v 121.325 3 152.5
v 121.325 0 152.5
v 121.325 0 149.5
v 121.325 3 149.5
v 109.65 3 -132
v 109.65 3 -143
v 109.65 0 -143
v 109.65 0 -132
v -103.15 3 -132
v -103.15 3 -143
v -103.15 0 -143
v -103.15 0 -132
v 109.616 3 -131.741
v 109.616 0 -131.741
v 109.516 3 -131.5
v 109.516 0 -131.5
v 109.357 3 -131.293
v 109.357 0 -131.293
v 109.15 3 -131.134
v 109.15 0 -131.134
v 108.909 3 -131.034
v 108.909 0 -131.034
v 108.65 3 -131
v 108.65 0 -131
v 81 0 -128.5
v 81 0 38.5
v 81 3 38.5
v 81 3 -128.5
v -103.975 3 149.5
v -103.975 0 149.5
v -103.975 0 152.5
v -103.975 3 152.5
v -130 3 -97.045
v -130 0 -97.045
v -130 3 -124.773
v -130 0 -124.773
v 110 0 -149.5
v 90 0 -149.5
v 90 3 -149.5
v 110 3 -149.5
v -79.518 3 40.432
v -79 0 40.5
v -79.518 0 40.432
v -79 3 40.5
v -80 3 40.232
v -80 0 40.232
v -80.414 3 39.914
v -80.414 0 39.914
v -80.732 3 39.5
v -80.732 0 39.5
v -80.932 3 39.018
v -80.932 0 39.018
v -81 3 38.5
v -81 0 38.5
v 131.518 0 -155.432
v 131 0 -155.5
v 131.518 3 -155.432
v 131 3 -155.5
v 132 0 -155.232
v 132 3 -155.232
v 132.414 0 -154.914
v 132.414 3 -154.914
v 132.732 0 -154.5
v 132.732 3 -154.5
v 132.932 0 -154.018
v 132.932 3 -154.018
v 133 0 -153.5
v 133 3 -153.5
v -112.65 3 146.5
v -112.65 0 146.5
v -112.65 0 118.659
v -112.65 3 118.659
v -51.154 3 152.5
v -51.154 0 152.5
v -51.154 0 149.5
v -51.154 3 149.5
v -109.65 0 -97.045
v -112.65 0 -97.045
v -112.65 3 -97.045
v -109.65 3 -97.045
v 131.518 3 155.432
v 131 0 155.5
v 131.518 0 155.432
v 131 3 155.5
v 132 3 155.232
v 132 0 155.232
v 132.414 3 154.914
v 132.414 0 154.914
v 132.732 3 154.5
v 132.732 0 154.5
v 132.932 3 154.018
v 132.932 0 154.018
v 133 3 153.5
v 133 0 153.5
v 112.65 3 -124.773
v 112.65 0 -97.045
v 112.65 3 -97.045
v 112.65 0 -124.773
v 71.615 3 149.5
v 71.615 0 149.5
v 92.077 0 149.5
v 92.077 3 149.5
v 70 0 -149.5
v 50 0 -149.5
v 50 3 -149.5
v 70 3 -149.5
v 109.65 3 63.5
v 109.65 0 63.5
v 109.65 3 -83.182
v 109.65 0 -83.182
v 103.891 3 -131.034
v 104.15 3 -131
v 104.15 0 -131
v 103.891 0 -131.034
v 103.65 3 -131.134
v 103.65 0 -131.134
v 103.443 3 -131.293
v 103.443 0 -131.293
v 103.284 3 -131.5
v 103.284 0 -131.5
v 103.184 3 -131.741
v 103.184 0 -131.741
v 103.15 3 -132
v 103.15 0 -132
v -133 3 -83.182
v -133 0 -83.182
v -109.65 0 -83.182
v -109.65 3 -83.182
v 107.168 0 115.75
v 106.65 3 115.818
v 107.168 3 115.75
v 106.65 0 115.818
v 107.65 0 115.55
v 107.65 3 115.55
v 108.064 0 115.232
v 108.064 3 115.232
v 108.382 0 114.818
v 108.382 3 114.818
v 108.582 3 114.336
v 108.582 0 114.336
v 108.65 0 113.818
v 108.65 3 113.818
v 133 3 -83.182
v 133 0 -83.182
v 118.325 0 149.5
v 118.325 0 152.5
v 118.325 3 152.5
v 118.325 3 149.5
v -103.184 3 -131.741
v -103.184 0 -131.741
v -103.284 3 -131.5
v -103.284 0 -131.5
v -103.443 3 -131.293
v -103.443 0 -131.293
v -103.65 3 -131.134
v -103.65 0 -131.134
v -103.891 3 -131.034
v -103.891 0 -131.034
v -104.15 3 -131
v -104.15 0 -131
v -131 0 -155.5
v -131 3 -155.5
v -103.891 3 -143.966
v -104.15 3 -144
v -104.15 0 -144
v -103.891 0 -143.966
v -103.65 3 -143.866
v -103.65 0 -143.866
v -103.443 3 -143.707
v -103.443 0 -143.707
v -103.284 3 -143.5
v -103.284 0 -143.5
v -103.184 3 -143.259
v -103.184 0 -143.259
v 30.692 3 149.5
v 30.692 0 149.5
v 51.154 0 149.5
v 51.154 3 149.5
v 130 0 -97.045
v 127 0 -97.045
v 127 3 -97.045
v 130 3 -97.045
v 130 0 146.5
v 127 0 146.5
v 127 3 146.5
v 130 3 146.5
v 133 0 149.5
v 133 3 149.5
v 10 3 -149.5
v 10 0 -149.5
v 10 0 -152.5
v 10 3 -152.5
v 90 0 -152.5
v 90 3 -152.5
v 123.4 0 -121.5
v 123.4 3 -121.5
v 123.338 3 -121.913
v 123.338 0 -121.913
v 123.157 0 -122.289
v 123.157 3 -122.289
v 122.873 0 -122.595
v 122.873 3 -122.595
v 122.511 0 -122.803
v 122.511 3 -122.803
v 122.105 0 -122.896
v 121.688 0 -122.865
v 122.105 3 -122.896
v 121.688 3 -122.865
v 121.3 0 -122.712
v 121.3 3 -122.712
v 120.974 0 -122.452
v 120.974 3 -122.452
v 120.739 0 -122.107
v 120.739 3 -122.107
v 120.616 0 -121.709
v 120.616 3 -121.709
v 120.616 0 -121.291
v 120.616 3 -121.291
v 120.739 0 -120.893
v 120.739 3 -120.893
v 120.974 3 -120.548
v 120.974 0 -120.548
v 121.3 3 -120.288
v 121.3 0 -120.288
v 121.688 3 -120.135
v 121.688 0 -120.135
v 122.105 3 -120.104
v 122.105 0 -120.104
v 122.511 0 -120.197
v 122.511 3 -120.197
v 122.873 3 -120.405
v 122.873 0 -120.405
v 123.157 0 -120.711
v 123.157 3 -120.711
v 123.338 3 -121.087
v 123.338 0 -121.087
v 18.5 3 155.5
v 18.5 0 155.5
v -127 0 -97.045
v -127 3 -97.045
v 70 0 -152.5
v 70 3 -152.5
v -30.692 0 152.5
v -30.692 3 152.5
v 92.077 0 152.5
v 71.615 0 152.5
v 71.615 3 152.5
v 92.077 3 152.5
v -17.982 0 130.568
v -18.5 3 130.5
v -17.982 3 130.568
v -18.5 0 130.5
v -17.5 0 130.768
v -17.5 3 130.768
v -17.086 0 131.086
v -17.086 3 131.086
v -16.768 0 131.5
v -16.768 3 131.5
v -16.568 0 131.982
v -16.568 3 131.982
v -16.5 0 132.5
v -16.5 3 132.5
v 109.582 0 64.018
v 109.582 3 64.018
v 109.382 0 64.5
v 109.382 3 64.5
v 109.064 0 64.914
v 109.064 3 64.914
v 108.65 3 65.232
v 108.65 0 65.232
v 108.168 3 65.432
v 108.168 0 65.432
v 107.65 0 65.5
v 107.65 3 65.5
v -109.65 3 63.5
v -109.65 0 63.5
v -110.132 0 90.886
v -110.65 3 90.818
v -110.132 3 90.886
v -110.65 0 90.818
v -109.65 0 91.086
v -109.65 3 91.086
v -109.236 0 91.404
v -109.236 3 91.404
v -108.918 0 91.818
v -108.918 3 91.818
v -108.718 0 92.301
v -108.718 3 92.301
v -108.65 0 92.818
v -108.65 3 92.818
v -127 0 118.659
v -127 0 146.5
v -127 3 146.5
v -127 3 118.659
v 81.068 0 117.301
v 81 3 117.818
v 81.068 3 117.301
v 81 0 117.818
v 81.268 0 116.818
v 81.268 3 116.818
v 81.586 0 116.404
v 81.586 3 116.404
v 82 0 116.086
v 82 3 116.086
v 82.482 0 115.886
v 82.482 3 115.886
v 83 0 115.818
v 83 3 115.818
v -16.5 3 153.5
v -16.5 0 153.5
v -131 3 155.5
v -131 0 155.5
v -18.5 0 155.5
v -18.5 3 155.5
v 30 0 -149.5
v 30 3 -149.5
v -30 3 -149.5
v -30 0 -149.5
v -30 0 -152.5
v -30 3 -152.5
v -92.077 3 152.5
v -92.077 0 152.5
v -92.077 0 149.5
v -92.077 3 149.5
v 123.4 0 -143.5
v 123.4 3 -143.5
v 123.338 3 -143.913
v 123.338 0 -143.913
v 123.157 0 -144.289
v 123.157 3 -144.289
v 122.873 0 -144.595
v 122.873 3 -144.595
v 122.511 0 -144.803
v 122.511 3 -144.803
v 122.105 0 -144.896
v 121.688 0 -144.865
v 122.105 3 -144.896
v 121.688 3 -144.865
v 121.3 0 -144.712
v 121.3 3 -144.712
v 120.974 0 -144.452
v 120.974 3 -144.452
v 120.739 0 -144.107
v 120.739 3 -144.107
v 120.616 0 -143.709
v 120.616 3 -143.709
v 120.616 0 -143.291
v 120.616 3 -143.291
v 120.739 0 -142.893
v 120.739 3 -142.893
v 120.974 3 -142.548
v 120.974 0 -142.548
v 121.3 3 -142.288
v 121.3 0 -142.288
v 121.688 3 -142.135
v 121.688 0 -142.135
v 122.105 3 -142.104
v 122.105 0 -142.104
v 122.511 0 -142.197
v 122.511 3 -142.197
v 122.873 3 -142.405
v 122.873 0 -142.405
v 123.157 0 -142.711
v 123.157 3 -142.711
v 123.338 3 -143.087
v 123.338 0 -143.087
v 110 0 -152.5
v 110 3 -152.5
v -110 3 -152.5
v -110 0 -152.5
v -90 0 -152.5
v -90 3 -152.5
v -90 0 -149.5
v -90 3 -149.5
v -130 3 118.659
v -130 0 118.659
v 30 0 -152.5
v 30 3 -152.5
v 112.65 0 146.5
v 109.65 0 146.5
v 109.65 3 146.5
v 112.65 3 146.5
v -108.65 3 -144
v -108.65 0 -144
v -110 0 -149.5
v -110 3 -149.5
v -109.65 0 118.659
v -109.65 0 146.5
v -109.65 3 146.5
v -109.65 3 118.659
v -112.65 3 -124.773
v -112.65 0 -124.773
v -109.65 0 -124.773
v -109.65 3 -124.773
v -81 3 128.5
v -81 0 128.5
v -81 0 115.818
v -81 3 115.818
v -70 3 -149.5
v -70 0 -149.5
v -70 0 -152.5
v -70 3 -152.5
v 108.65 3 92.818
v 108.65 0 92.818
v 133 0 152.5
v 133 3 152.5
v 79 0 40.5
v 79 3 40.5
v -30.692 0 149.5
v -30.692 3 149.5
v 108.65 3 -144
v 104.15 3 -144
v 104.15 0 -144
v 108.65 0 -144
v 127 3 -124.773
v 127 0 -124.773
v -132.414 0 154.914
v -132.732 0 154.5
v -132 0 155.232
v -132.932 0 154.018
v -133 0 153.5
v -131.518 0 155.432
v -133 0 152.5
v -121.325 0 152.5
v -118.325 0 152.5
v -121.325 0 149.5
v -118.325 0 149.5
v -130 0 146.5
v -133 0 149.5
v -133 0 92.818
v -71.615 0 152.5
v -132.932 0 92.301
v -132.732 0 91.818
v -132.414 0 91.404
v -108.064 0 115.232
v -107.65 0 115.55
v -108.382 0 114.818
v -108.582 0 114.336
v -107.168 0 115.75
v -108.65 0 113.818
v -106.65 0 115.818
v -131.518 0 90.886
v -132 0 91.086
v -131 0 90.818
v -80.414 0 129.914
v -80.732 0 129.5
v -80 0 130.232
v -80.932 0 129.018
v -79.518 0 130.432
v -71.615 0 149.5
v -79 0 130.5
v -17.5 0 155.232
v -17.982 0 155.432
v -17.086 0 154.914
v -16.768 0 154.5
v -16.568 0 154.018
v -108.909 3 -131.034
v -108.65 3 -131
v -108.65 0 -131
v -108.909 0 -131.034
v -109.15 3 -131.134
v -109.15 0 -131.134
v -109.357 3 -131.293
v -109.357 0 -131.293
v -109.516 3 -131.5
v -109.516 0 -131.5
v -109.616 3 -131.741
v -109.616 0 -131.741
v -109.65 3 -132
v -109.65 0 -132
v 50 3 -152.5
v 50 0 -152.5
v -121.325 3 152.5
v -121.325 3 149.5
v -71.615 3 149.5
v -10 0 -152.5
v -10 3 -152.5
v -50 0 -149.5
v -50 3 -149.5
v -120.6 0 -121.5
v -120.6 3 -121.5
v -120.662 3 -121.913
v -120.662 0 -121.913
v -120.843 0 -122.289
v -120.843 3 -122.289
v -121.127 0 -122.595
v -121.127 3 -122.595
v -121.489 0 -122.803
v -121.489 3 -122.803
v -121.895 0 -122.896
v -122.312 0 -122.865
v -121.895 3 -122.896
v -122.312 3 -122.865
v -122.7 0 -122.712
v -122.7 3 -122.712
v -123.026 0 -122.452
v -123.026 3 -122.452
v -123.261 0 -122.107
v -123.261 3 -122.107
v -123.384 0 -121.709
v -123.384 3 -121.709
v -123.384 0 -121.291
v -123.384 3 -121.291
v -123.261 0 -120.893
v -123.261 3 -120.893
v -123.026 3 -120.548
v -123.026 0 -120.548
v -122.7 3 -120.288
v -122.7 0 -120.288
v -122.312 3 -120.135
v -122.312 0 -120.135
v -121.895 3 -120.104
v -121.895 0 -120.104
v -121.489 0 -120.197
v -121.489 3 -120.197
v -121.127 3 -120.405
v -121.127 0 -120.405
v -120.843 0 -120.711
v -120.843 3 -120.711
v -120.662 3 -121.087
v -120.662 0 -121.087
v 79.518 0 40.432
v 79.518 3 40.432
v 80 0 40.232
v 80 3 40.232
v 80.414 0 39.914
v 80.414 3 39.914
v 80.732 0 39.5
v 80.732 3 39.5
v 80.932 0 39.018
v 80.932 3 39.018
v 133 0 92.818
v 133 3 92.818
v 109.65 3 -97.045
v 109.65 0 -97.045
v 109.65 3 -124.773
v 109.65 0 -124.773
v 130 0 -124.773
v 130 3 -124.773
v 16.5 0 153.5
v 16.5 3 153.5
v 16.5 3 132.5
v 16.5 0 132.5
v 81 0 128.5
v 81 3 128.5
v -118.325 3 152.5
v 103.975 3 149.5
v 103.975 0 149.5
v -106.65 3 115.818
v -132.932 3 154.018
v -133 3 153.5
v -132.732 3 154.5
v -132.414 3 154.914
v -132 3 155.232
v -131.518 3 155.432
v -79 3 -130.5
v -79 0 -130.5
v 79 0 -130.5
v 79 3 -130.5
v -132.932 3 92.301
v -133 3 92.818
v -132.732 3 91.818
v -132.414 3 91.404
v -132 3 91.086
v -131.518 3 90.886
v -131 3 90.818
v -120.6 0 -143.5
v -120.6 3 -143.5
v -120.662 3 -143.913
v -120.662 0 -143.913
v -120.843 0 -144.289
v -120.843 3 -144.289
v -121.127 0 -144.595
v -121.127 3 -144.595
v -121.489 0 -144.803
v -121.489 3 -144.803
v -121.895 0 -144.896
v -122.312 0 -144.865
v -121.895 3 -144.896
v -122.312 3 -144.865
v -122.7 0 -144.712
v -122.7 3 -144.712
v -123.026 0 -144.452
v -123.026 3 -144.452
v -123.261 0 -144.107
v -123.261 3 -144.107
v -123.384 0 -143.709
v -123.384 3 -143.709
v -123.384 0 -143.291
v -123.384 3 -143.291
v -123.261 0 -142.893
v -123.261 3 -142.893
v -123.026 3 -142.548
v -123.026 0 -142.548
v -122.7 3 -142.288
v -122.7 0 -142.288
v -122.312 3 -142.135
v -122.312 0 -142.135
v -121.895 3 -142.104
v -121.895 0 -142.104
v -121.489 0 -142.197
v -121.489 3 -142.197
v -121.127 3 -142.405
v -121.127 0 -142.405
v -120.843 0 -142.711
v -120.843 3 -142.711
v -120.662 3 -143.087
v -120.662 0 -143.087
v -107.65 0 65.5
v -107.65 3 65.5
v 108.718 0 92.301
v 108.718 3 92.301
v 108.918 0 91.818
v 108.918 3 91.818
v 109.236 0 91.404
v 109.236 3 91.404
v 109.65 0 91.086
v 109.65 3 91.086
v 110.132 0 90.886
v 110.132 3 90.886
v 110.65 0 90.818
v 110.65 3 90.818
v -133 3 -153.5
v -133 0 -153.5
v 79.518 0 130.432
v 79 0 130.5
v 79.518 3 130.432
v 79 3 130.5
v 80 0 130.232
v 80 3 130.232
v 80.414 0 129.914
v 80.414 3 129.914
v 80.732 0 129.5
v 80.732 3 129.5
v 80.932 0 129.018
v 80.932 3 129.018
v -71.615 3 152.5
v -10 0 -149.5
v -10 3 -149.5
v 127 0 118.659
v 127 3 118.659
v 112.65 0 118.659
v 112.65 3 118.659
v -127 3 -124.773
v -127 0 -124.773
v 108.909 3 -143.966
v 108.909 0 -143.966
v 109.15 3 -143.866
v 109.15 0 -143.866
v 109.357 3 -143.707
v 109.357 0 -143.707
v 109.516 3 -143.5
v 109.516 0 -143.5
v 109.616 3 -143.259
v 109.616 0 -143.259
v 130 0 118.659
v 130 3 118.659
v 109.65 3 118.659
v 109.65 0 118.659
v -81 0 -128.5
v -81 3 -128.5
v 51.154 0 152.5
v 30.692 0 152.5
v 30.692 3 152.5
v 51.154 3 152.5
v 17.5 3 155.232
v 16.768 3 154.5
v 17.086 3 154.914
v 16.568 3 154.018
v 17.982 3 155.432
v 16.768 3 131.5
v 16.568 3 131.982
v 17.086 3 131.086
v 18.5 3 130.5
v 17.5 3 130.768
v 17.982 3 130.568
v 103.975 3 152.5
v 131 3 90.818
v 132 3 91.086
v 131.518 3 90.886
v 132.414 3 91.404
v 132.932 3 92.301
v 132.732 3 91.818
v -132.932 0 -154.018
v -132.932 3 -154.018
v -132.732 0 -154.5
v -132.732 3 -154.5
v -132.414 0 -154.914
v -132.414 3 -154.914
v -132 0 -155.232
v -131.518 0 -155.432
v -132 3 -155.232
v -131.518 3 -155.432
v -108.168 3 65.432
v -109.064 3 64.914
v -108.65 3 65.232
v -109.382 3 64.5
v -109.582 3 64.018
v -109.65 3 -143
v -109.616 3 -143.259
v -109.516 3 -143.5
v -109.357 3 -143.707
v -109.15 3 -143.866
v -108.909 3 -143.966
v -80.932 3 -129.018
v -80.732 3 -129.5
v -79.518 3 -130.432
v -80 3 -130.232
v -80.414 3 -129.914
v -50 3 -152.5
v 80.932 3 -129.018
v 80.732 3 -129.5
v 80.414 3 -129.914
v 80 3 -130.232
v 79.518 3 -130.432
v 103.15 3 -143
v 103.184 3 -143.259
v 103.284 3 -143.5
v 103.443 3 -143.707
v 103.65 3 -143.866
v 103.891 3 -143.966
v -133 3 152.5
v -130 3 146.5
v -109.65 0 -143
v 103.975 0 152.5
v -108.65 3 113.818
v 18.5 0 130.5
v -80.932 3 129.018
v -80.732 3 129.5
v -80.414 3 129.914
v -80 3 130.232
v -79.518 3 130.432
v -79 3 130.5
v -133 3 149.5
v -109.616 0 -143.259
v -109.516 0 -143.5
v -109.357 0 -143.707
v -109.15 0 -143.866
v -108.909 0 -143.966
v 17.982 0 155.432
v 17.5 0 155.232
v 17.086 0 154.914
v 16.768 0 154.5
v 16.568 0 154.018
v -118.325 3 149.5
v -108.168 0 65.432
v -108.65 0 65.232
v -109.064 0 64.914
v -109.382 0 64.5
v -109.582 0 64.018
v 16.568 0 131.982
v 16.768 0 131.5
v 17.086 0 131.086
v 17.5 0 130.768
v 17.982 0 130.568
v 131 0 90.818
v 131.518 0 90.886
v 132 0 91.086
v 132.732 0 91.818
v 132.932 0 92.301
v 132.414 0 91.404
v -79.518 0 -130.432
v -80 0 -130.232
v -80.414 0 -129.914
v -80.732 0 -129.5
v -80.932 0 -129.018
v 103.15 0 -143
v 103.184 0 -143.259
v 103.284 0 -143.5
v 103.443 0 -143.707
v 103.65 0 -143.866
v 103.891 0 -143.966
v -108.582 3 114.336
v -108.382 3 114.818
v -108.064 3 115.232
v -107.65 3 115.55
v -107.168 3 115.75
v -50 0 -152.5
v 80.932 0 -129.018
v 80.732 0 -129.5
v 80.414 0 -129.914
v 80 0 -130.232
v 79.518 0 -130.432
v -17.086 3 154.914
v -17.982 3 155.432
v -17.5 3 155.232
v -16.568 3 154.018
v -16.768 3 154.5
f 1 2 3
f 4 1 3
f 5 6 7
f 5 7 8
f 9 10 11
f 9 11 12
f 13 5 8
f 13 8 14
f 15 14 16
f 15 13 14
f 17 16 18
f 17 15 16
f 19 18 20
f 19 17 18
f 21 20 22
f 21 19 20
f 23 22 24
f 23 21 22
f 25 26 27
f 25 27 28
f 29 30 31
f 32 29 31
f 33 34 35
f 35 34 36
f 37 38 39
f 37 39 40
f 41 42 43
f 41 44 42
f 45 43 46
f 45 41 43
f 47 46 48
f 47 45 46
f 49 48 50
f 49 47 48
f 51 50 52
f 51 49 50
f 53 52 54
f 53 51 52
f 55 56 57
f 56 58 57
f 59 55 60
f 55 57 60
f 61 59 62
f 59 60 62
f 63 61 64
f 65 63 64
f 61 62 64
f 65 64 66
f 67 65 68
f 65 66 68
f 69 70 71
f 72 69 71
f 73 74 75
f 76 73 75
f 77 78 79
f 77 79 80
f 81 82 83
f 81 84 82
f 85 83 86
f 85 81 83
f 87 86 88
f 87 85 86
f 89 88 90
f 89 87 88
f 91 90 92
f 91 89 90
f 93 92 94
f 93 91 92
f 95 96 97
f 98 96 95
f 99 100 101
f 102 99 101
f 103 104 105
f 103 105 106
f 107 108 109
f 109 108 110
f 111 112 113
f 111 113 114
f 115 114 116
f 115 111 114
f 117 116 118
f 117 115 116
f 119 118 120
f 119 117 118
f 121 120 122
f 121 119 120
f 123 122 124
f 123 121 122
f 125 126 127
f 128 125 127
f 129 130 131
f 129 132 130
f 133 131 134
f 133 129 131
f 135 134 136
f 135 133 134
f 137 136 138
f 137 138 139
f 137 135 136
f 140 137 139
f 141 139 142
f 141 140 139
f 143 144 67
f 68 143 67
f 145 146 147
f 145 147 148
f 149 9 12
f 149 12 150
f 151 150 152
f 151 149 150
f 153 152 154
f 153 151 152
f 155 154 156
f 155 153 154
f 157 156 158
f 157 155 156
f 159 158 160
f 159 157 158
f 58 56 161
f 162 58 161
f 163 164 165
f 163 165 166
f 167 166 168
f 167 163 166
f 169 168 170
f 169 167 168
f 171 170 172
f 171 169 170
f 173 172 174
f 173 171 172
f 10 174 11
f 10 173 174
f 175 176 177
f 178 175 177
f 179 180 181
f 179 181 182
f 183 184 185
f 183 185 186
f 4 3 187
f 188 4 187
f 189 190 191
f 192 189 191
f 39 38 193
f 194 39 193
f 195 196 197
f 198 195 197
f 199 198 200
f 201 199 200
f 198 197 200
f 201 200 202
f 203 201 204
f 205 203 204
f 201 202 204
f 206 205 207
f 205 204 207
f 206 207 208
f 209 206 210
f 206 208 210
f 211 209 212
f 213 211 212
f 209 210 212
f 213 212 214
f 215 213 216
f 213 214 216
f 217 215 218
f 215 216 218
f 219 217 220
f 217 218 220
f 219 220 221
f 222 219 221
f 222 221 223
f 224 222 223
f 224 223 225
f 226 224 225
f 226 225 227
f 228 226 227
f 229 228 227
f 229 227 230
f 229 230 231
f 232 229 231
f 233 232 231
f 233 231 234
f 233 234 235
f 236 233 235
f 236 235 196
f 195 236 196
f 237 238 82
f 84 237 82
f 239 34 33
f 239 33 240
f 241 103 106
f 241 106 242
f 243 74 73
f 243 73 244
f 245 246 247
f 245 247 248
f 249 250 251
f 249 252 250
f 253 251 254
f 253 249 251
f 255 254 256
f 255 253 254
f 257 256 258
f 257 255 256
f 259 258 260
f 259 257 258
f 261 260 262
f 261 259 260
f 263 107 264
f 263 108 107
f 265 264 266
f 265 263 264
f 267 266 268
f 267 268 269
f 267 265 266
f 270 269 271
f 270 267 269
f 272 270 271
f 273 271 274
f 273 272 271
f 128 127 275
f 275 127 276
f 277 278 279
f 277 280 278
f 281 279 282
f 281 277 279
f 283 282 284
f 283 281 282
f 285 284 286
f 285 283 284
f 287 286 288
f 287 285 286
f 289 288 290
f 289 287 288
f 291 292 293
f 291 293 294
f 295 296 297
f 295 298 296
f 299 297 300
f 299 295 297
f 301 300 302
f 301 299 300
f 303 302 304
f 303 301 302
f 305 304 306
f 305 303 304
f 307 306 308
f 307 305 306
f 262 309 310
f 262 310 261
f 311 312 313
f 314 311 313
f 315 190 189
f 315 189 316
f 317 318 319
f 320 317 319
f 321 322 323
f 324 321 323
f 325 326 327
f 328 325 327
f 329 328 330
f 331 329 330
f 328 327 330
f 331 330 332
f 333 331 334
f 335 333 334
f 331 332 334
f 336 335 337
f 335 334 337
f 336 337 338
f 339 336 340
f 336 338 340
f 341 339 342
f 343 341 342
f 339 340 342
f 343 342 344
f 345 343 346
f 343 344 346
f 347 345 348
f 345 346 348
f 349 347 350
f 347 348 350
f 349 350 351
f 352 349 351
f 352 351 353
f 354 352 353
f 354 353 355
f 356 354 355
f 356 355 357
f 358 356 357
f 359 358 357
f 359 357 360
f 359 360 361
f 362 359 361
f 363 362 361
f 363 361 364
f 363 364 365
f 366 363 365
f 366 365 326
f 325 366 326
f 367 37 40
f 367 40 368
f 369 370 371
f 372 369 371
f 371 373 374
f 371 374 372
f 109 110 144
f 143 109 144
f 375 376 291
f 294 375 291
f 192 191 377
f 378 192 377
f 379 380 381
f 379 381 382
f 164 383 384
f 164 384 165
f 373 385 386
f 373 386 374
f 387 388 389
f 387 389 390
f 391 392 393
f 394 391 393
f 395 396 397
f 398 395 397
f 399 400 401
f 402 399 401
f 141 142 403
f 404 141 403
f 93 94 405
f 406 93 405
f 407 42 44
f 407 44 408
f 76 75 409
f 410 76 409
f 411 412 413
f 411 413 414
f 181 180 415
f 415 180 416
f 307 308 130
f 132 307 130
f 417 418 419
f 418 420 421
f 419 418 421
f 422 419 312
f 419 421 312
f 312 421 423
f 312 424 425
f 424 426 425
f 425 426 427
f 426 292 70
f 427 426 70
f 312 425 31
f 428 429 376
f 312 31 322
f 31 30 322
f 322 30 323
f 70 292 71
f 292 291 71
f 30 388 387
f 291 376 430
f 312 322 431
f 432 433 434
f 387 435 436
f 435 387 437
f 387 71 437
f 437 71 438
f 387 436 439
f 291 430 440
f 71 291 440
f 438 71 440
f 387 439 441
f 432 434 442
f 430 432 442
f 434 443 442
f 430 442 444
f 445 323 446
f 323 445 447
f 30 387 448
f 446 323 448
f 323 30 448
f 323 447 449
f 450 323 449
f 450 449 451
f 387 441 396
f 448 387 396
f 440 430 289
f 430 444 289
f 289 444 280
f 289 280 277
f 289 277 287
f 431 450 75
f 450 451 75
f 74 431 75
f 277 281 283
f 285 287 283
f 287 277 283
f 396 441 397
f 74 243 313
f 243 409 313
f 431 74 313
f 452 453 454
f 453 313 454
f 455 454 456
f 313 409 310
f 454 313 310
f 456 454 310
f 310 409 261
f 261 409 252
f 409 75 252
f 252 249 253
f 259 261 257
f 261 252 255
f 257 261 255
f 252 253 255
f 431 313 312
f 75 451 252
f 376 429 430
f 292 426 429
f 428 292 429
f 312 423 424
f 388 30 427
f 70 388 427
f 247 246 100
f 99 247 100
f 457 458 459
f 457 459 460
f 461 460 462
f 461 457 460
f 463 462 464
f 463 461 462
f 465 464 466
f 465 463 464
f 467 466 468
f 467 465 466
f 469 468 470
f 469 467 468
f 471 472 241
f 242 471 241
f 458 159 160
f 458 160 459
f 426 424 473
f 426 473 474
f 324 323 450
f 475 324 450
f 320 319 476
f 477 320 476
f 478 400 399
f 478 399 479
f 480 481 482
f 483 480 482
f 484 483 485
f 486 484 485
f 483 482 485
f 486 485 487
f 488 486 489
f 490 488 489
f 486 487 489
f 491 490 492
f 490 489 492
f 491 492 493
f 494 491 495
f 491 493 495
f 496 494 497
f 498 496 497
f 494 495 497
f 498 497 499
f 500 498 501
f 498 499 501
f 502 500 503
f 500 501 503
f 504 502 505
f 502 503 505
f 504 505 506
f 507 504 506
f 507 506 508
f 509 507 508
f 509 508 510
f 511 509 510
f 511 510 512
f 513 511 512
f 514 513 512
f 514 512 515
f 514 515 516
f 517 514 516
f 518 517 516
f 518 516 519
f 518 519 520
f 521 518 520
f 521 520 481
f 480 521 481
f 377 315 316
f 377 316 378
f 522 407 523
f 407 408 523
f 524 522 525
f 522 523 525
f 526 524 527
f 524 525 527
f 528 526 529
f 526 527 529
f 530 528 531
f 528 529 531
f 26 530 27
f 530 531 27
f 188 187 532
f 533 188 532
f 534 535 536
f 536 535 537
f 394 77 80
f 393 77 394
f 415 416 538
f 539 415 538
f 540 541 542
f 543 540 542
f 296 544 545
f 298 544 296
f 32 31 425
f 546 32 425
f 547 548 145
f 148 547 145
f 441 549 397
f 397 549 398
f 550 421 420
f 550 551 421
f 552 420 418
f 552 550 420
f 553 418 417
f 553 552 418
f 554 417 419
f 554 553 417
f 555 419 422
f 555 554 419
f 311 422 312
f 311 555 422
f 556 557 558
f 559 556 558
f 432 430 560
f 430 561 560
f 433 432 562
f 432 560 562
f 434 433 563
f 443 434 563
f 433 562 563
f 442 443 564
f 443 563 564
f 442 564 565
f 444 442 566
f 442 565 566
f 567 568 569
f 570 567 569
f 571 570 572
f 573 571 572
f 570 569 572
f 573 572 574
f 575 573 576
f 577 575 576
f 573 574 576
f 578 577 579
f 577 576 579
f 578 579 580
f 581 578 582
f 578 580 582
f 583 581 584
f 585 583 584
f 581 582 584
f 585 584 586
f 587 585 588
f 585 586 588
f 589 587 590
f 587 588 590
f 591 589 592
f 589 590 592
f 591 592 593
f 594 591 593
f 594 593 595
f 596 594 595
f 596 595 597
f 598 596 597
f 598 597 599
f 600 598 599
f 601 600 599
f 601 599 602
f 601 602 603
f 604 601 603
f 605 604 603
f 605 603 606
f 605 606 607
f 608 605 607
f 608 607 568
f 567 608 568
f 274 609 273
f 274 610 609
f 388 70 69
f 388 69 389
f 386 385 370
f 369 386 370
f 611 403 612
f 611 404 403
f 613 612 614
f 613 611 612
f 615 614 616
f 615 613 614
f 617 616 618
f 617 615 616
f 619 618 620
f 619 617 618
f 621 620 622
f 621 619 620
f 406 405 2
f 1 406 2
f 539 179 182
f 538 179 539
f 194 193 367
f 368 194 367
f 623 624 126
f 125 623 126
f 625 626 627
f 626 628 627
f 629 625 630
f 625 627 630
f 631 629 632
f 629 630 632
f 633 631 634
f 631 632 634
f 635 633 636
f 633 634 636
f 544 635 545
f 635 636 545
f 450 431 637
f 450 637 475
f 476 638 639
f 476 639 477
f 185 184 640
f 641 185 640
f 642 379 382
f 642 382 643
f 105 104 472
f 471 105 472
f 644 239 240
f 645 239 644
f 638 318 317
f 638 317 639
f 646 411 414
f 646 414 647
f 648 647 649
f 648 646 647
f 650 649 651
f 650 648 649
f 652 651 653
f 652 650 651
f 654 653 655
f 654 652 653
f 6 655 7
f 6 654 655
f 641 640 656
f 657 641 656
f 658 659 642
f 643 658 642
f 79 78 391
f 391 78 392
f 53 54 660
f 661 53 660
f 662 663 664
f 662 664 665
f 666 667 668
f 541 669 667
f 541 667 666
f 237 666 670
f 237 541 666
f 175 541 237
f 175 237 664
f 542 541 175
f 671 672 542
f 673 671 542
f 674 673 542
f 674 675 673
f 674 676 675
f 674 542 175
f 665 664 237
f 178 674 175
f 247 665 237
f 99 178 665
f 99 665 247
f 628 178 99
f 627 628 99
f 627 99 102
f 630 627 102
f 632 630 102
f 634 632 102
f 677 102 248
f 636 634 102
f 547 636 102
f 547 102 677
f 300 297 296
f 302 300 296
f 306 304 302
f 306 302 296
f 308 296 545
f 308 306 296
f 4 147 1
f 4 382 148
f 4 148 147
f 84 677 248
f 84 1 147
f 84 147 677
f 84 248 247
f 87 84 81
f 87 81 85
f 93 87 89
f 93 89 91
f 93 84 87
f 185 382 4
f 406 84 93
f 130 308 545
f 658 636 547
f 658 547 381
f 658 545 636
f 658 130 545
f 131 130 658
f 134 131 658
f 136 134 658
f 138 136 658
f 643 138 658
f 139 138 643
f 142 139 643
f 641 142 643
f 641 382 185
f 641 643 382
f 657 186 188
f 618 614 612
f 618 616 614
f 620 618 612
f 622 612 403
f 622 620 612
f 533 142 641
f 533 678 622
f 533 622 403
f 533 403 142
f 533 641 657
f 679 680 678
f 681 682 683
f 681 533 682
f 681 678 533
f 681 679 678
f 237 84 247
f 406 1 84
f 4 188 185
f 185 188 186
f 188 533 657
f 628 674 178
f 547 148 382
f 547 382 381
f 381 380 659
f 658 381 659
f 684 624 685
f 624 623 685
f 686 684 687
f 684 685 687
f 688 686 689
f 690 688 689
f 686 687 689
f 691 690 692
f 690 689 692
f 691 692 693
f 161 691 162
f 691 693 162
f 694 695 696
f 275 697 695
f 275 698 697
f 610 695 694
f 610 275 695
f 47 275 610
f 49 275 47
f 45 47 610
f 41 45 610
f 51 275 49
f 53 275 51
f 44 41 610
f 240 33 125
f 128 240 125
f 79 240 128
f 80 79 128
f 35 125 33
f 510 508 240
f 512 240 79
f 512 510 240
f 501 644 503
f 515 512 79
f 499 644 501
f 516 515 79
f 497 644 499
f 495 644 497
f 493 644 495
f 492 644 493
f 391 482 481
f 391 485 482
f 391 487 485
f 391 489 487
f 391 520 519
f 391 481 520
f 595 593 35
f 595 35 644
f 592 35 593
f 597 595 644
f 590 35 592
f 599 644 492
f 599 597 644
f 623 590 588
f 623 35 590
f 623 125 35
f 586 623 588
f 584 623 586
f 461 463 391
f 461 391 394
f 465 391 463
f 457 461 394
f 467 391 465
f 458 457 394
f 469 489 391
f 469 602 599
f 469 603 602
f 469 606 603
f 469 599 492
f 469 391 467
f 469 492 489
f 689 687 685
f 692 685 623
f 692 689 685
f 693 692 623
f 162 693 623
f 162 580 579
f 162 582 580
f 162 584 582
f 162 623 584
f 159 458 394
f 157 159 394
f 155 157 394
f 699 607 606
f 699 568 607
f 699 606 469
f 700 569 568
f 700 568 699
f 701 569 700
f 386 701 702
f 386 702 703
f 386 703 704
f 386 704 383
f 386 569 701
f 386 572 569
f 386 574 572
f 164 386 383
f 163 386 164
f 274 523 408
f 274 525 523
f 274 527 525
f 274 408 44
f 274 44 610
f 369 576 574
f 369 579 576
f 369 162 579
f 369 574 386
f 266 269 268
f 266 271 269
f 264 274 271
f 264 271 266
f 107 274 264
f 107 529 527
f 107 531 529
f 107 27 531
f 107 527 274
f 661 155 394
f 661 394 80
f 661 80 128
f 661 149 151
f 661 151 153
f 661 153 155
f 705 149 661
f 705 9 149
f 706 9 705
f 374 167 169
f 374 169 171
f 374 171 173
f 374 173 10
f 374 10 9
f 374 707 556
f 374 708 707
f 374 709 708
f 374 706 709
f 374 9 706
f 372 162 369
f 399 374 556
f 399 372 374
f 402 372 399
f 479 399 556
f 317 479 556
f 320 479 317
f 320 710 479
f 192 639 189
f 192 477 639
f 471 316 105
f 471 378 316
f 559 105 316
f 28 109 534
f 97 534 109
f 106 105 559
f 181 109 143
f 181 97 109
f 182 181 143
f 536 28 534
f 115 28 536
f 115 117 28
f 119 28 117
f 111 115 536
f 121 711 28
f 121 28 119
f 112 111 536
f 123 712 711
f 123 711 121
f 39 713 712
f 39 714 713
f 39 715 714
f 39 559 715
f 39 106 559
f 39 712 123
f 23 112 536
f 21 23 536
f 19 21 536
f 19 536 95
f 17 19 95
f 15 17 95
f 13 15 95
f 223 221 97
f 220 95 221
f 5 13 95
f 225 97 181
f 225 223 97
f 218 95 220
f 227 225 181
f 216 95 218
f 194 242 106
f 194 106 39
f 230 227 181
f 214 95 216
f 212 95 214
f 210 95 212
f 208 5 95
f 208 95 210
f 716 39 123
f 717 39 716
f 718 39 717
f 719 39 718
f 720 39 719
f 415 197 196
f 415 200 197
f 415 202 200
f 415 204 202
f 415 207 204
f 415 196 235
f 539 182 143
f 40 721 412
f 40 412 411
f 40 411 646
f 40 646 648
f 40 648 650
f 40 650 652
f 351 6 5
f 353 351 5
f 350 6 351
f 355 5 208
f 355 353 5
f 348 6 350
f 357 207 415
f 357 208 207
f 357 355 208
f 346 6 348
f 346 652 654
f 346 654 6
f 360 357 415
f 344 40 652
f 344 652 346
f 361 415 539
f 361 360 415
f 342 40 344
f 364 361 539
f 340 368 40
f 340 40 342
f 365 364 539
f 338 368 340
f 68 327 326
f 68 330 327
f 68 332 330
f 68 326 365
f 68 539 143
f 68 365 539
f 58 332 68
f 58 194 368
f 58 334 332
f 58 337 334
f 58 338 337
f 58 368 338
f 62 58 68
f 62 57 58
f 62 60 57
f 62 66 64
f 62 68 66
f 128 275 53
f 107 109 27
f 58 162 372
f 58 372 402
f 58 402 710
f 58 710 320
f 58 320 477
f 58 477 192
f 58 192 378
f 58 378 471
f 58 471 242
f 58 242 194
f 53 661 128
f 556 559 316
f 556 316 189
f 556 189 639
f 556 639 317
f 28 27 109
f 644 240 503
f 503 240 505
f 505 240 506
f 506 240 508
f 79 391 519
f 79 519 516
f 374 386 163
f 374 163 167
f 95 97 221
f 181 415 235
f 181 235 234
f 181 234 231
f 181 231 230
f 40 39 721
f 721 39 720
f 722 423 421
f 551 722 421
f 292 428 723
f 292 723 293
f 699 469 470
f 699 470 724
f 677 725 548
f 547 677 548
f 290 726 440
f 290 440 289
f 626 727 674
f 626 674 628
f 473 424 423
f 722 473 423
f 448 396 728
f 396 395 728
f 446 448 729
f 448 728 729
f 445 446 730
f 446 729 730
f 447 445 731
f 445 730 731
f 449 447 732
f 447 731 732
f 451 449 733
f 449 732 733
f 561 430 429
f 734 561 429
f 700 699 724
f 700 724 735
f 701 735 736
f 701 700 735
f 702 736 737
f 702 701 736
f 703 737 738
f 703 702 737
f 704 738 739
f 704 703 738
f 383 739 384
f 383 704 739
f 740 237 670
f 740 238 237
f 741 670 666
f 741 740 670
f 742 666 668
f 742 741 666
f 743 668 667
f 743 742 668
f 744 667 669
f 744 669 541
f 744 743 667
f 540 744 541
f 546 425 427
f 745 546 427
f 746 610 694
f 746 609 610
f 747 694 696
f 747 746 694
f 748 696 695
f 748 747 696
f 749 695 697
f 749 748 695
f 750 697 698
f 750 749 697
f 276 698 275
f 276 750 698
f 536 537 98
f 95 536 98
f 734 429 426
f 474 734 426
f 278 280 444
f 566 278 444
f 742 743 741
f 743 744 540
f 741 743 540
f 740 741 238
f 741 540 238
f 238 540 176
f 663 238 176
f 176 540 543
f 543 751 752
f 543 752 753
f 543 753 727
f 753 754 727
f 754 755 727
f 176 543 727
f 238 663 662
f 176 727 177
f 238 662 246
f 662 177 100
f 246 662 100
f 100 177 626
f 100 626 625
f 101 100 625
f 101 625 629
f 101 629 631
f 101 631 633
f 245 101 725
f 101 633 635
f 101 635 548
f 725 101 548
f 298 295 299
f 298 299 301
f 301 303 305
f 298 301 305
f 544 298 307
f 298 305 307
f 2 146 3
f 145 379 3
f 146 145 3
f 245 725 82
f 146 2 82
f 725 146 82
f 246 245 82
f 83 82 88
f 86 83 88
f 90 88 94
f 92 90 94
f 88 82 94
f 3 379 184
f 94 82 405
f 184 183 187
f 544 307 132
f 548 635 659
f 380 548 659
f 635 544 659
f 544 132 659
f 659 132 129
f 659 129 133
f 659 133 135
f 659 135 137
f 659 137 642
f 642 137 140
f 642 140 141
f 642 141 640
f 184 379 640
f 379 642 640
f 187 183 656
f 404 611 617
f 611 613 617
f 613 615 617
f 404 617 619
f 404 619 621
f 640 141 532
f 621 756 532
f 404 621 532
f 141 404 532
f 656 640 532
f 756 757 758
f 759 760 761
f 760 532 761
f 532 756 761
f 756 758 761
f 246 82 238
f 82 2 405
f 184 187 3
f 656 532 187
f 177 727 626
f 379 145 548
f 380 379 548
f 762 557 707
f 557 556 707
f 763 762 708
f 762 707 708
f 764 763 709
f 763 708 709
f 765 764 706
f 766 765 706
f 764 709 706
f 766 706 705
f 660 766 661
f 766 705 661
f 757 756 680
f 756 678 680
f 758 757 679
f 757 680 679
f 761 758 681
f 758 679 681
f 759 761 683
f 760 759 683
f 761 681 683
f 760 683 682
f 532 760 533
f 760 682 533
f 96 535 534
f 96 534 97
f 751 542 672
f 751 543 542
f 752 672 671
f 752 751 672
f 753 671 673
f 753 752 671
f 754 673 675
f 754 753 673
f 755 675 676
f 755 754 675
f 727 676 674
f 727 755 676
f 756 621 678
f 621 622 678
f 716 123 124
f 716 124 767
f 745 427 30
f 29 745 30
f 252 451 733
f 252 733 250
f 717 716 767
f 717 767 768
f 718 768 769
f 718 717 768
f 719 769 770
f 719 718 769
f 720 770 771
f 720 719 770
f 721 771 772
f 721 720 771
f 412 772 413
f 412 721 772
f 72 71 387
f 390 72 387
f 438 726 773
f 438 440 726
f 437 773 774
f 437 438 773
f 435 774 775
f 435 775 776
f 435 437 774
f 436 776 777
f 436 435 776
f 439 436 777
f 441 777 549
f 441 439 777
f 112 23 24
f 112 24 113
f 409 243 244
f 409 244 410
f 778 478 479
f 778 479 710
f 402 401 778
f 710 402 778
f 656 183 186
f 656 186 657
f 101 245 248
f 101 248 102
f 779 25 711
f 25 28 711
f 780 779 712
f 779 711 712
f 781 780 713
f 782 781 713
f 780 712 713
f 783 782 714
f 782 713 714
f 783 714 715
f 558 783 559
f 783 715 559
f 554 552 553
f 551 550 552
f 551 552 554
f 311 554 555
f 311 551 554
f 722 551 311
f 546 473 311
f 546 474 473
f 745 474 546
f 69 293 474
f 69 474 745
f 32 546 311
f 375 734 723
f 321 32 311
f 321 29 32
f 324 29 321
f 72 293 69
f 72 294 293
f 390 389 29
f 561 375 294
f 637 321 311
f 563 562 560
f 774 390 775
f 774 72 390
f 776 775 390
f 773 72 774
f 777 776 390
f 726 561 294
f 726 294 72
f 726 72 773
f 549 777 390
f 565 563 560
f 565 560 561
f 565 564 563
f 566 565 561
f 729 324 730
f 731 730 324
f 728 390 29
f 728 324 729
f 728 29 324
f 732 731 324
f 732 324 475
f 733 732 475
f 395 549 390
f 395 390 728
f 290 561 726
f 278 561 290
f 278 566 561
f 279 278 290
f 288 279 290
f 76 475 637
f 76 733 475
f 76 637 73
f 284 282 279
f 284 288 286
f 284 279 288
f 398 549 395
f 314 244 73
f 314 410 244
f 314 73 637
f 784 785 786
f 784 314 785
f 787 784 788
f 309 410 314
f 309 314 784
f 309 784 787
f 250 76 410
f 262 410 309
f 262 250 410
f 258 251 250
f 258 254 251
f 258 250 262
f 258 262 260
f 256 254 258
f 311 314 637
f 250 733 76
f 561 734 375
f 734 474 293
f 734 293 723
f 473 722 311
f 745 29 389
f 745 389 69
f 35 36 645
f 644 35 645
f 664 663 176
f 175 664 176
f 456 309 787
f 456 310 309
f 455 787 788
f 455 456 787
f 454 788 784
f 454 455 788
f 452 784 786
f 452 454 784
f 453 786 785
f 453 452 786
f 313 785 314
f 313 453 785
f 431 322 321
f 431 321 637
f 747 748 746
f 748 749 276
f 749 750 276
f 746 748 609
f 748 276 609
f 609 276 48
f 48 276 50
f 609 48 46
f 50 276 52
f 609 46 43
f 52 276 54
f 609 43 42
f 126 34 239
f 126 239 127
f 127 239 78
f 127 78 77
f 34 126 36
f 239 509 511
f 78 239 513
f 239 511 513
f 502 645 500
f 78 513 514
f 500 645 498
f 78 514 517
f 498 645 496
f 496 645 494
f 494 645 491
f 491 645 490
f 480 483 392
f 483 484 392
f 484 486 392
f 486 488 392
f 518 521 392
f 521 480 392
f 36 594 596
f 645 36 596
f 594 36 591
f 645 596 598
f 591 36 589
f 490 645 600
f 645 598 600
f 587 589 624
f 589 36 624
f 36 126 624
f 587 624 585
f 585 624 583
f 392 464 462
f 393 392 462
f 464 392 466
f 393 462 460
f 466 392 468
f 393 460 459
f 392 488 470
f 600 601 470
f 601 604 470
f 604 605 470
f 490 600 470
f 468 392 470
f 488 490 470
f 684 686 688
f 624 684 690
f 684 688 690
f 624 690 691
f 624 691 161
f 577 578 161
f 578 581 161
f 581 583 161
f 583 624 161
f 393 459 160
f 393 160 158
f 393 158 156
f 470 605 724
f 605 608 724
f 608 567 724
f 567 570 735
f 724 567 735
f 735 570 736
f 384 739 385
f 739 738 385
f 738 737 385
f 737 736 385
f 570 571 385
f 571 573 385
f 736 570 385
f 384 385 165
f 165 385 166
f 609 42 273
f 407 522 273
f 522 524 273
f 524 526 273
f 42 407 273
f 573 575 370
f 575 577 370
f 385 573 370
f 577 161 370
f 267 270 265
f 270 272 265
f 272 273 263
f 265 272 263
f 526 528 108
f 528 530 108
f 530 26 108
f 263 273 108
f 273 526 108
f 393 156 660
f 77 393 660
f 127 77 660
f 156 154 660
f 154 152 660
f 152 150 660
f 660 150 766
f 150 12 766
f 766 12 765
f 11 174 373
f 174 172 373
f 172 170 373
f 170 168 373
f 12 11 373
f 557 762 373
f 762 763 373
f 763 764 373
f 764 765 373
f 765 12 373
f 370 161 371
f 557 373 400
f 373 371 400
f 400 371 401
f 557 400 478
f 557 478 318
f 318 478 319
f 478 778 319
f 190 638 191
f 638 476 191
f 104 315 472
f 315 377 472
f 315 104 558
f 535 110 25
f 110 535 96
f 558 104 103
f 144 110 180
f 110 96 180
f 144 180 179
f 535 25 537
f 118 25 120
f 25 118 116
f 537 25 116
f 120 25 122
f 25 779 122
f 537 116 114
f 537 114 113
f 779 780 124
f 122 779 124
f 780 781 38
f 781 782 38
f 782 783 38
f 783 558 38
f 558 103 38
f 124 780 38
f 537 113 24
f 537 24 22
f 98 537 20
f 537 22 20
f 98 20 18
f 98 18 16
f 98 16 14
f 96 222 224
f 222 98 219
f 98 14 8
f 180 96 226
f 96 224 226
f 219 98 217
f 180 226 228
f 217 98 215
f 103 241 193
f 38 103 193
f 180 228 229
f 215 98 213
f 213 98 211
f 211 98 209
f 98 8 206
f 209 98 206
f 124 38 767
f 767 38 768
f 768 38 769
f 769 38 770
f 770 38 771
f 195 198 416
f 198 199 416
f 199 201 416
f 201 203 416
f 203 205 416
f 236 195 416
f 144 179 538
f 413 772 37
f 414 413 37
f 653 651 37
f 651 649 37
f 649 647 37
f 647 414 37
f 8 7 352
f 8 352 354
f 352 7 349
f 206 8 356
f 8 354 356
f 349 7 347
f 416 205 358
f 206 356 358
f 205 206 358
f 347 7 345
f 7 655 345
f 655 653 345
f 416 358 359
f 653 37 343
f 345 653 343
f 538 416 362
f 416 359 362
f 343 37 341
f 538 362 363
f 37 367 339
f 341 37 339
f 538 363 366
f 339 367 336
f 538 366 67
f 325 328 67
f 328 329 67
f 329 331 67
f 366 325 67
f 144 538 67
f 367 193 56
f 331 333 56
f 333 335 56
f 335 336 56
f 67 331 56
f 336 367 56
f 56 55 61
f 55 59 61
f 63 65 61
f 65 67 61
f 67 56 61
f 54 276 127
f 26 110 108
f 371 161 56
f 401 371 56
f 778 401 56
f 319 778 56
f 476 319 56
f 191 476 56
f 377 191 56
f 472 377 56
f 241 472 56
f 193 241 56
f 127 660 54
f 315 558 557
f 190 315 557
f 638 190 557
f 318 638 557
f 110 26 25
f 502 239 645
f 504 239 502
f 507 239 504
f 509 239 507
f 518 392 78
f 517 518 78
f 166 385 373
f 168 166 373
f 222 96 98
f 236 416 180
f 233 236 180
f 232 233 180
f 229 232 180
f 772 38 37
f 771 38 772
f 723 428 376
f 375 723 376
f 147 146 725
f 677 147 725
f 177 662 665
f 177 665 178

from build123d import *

# Parameters (mm, degrees)
SKETCH1_W               = 3
SKETCH1_H               = 27.8409
SKETCH1_W_2             = 20.4615
SKETCH1_H_2             = 3
SKETCH1_W_3             = 162
SKETCH1_H_3             = 261
SKETCH1_H_4             = 27.7273
SKETCH1_W_4             = 20
BOSS_EXTRUDE1_DEPTH     = 3
SKETCH4_W               = 162
SKETCH4_H               = 25
BOSS_EXTRUDE2_DEPTH     = 3
SKETCH3_W               = 28.65
SKETCH3_H               = 25.3182
SKETCH3_W_2             = 27.65
SKETCH3_H_2             = 25
SKETCH3_W_3             = 33
CUT_EXTRUDE2_DEPTH      = 1
CUT_EXTRUDE2_DEPTH_BACK = 4
FILLET1_R               = 2
FILLET2_R               = 2
FILLET3_R               = 2
SKETCH5_W               = 3
SKETCH5_H               = 3
BOSS_EXTRUDE3_DEPTH     = 3
SKETCH6_R               = 1.4
CUT_EXTRUDE3_DEPTH      = 1
CUT_EXTRUDE3_DEPTH_BACK = 4


with BuildPart() as part:
    # Sketch1 → Boss-Extrude1 (new body)
    with BuildSketch(Plane(origin=(0, 0, 0), x_dir=(1, 0, 0), z_dir=(0, 1, 0))):
        Polygon((-133, -152.5), (-133, -155.5), (133, -155.5), (133, -152.5), (112.4444, -152.5), (103.975, -152.5), (103.975, -149.5), (112.4444, -149.5), (133, -149.5), (133, -90.8182), (109.65, -90.8182), (109.65, 83.1818), (133, 83.1818), (133, 155.5), (-133, 155.5), (-133, 83.1818), (-109.65, 83.1818), (-109.65, -90.8182), (-133, -90.8182), (-133, -149.5), (-112.4444, -149.5), (-103.975, -149.5), (-103.975, -152.5), (-112.4444, -152.5), align=None)
        with Locations((-128.5, -132.57955)):
            Rectangle(SKETCH1_W, SKETCH1_H, mode=Mode.SUBTRACT)
        with Locations((-111.15, -132.57955)):
            Rectangle(SKETCH1_W, SKETCH1_H, mode=Mode.SUBTRACT)
        with Locations((-81.846, -151)):
            Rectangle(SKETCH1_W_2, SKETCH1_H_2, mode=Mode.SUBTRACT)
        with Locations((-40.923, -151)):
            Rectangle(SKETCH1_W_2, SKETCH1_H_2, mode=Mode.SUBTRACT)
        with Locations((0, -151)):
            Rectangle(SKETCH1_W_2, SKETCH1_H_2, mode=Mode.SUBTRACT)
        with Locations((40.923, -151)):
            Rectangle(SKETCH1_W_2, SKETCH1_H_2, mode=Mode.SUBTRACT)
        with Locations((81.846, -151)):
            Rectangle(SKETCH1_W_2, SKETCH1_H_2, mode=Mode.SUBTRACT)
        with Locations((111.15, -132.57955)):
            Rectangle(SKETCH1_W, SKETCH1_H, mode=Mode.SUBTRACT)
        with Locations((128.5, -132.57955)):
            Rectangle(SKETCH1_W, SKETCH1_H, mode=Mode.SUBTRACT)
        Rectangle(SKETCH1_W_3, SKETCH1_H_3, mode=Mode.SUBTRACT)
        with Locations((-128.5, 110.90905)):
            Rectangle(SKETCH1_W, SKETCH1_H_4, mode=Mode.SUBTRACT)
        with Locations((-111.15, 110.90905)):
            Rectangle(SKETCH1_W, SKETCH1_H_4, mode=Mode.SUBTRACT)
        with Locations((-100, 151)):
            Rectangle(SKETCH1_W_4, SKETCH1_H_2, mode=Mode.SUBTRACT)
        with Locations((-60, 151)):
            Rectangle(SKETCH1_W_4, SKETCH1_H_2, mode=Mode.SUBTRACT)
        with Locations((-20, 151)):
            Rectangle(SKETCH1_W_4, SKETCH1_H_2, mode=Mode.SUBTRACT)
        with Locations((20, 151)):
            Rectangle(SKETCH1_W_4, SKETCH1_H_2, mode=Mode.SUBTRACT)
        with Locations((60, 151)):
            Rectangle(SKETCH1_W_4, SKETCH1_H_2, mode=Mode.SUBTRACT)
        with Locations((111.15, 110.90905)):
            Rectangle(SKETCH1_W, SKETCH1_H_4, mode=Mode.SUBTRACT)
        with Locations((128.5, 110.90905)):
            Rectangle(SKETCH1_W, SKETCH1_H_4, mode=Mode.SUBTRACT)
        with Locations((100, 151)):
            Rectangle(SKETCH1_W_4, SKETCH1_H_2, mode=Mode.SUBTRACT)
    extrude(amount=BOSS_EXTRUDE1_DEPTH)

    # Sketch4 → Boss-Extrude2 (add)
    with BuildSketch(Plane.XZ):
        with Locations((0, 53)):
            Rectangle(SKETCH4_W, SKETCH4_H)
    extrude(amount=-BOSS_EXTRUDE2_DEPTH)

    # Sketch3 → Cut-Extrude2 (cut, two sides)
    with BuildSketch(Plane(origin=(0, 3, 0), x_dir=(1, 0, 0), z_dir=(0, 1, 0))) as cut_extrude2_sk:
        with Locations((-95.325, -78.1591)):
            Rectangle(SKETCH3_W, SKETCH3_H)
        with Locations((-94.825, -103.3182)):
            Rectangle(SKETCH3_W_2, SKETCH3_H_2)
        with Locations((0, -143)):
            Rectangle(SKETCH3_W_3, SKETCH3_H_2)
        with Locations((94.825, -103.3182)):
            Rectangle(SKETCH3_W_2, SKETCH3_H_2)
        with Locations((95.325, -78.1591)):
            Rectangle(SKETCH3_W, SKETCH3_H)
    extrude(amount=CUT_EXTRUDE2_DEPTH, mode=Mode.SUBTRACT)
    extrude(cut_extrude2_sk.sketch, amount=-CUT_EXTRUDE2_DEPTH_BACK, mode=Mode.SUBTRACT)

    # Fillet1
    fillet1_edges = [part.edges().sort_by_distance(p)[0] for p in [
        (-81, 1.5, -130.5),
        (81, 1.5, -130.5),
        (81, 1.5, 40.5),
        (-81, 1.5, 40.5),
        (133, 1.5, -155.5),
        (-109.65, 1.5, 65.5),
        (109.65, 1.5, 65.5),
        (-133, 1.5, -155.5),
    ]]
    fillet(fillet1_edges, radius=FILLET1_R)

    # Fillet2
    fillet2_edges = [part.edges().sort_by_distance(p)[0] for p in [
        (-108.65, 1.5, 115.8182),
        (-108.65, 1.5, 90.8182),
        (-16.5, 1.5, 155.5),
        (-133, 1.5, 155.5),
        (-81, 1.5, 130.5),
        (-133, 1.5, 90.8182),
        (-16.5, 1.5, 130.5),
    ]]
    fillet(fillet2_edges, radius=FILLET2_R)

    # Fillet3
    fillet3_edges = [part.edges().sort_by_distance(p)[0] for p in [
        (81, 1.5, 130.5),
        (133, 1.5, 90.8182),
        (133, 1.5, 155.5),
        (16.5, 1.5, 155.5),
        (16.5, 1.5, 130.5),
        (81, 1.5, 115.8182),
        (108.65, 1.5, 90.8182),
        (108.65, 1.5, 115.8182),
    ]]
    fillet(fillet3_edges, radius=FILLET3_R)

    # Sketch5 → Boss-Extrude3 (add)
    with BuildSketch(Plane(origin=(0, 0, 0), x_dir=(1, 0, 0), z_dir=(0, 1, 0))):
        with Locations((-119.825, -151)):
            Rectangle(SKETCH5_W, SKETCH5_H)
        with Locations((119.825, -151)):
            Rectangle(SKETCH5_W, SKETCH5_H)
    extrude(amount=BOSS_EXTRUDE3_DEPTH)

    # Sketch6 → Cut-Extrude3 (cut, two sides)
    with BuildSketch(Plane(origin=(0, 3, 0), x_dir=(1, 0, 0), z_dir=(0, 1, 0))) as cut_extrude3_sk:
        with Locations((-122, 143.5)):
            Circle(SKETCH6_R)
        with Locations((-122, 121.5)):
            Circle(SKETCH6_R)
        with Locations((122, 121.5)):
            Circle(SKETCH6_R)
        with Locations((122, 143.5)):
            Circle(SKETCH6_R)
        with BuildLine():
            Line((-104.15, 131), (-108.65, 131))
            ThreePointArc((-108.65, 131), (-109.357106781, 131.292893219), (-109.65, 132))
            Line((-109.65, 132), (-109.65, 143))
            ThreePointArc((-109.65, 143), (-109.357106781, 143.707106781), (-108.65, 144))
            Line((-108.65, 144), (-104.15, 144))
            ThreePointArc((-104.15, 144), (-103.442893219, 143.707106781), (-103.15, 143))
            Line((-103.15, 143), (-103.15, 132))
            ThreePointArc((-103.15, 132), (-103.442893219, 131.292893219), (-104.15, 131))
        make_face()
        with BuildLine():
            Line((104.15, 144), (108.65, 144))
            ThreePointArc((108.65, 144), (109.357106781, 143.707106781), (109.65, 143))
            Line((109.65, 143), (109.65, 132))
            ThreePointArc((109.65, 132), (109.357106781, 131.292893219), (108.65, 131))
            Line((108.65, 131), (104.15, 131))
            ThreePointArc((104.15, 131), (103.442893219, 131.292893219), (103.15, 132))
            Line((103.15, 132), (103.15, 143))
            ThreePointArc((103.15, 143), (103.442893219, 143.707106781), (104.15, 144))
        make_face()
    extrude(amount=CUT_EXTRUDE3_DEPTH, mode=Mode.SUBTRACT)
    extrude(cut_extrude3_sk.sketch, amount=-CUT_EXTRUDE3_DEPTH_BACK, mode=Mode.SUBTRACT)


solid = part.part
